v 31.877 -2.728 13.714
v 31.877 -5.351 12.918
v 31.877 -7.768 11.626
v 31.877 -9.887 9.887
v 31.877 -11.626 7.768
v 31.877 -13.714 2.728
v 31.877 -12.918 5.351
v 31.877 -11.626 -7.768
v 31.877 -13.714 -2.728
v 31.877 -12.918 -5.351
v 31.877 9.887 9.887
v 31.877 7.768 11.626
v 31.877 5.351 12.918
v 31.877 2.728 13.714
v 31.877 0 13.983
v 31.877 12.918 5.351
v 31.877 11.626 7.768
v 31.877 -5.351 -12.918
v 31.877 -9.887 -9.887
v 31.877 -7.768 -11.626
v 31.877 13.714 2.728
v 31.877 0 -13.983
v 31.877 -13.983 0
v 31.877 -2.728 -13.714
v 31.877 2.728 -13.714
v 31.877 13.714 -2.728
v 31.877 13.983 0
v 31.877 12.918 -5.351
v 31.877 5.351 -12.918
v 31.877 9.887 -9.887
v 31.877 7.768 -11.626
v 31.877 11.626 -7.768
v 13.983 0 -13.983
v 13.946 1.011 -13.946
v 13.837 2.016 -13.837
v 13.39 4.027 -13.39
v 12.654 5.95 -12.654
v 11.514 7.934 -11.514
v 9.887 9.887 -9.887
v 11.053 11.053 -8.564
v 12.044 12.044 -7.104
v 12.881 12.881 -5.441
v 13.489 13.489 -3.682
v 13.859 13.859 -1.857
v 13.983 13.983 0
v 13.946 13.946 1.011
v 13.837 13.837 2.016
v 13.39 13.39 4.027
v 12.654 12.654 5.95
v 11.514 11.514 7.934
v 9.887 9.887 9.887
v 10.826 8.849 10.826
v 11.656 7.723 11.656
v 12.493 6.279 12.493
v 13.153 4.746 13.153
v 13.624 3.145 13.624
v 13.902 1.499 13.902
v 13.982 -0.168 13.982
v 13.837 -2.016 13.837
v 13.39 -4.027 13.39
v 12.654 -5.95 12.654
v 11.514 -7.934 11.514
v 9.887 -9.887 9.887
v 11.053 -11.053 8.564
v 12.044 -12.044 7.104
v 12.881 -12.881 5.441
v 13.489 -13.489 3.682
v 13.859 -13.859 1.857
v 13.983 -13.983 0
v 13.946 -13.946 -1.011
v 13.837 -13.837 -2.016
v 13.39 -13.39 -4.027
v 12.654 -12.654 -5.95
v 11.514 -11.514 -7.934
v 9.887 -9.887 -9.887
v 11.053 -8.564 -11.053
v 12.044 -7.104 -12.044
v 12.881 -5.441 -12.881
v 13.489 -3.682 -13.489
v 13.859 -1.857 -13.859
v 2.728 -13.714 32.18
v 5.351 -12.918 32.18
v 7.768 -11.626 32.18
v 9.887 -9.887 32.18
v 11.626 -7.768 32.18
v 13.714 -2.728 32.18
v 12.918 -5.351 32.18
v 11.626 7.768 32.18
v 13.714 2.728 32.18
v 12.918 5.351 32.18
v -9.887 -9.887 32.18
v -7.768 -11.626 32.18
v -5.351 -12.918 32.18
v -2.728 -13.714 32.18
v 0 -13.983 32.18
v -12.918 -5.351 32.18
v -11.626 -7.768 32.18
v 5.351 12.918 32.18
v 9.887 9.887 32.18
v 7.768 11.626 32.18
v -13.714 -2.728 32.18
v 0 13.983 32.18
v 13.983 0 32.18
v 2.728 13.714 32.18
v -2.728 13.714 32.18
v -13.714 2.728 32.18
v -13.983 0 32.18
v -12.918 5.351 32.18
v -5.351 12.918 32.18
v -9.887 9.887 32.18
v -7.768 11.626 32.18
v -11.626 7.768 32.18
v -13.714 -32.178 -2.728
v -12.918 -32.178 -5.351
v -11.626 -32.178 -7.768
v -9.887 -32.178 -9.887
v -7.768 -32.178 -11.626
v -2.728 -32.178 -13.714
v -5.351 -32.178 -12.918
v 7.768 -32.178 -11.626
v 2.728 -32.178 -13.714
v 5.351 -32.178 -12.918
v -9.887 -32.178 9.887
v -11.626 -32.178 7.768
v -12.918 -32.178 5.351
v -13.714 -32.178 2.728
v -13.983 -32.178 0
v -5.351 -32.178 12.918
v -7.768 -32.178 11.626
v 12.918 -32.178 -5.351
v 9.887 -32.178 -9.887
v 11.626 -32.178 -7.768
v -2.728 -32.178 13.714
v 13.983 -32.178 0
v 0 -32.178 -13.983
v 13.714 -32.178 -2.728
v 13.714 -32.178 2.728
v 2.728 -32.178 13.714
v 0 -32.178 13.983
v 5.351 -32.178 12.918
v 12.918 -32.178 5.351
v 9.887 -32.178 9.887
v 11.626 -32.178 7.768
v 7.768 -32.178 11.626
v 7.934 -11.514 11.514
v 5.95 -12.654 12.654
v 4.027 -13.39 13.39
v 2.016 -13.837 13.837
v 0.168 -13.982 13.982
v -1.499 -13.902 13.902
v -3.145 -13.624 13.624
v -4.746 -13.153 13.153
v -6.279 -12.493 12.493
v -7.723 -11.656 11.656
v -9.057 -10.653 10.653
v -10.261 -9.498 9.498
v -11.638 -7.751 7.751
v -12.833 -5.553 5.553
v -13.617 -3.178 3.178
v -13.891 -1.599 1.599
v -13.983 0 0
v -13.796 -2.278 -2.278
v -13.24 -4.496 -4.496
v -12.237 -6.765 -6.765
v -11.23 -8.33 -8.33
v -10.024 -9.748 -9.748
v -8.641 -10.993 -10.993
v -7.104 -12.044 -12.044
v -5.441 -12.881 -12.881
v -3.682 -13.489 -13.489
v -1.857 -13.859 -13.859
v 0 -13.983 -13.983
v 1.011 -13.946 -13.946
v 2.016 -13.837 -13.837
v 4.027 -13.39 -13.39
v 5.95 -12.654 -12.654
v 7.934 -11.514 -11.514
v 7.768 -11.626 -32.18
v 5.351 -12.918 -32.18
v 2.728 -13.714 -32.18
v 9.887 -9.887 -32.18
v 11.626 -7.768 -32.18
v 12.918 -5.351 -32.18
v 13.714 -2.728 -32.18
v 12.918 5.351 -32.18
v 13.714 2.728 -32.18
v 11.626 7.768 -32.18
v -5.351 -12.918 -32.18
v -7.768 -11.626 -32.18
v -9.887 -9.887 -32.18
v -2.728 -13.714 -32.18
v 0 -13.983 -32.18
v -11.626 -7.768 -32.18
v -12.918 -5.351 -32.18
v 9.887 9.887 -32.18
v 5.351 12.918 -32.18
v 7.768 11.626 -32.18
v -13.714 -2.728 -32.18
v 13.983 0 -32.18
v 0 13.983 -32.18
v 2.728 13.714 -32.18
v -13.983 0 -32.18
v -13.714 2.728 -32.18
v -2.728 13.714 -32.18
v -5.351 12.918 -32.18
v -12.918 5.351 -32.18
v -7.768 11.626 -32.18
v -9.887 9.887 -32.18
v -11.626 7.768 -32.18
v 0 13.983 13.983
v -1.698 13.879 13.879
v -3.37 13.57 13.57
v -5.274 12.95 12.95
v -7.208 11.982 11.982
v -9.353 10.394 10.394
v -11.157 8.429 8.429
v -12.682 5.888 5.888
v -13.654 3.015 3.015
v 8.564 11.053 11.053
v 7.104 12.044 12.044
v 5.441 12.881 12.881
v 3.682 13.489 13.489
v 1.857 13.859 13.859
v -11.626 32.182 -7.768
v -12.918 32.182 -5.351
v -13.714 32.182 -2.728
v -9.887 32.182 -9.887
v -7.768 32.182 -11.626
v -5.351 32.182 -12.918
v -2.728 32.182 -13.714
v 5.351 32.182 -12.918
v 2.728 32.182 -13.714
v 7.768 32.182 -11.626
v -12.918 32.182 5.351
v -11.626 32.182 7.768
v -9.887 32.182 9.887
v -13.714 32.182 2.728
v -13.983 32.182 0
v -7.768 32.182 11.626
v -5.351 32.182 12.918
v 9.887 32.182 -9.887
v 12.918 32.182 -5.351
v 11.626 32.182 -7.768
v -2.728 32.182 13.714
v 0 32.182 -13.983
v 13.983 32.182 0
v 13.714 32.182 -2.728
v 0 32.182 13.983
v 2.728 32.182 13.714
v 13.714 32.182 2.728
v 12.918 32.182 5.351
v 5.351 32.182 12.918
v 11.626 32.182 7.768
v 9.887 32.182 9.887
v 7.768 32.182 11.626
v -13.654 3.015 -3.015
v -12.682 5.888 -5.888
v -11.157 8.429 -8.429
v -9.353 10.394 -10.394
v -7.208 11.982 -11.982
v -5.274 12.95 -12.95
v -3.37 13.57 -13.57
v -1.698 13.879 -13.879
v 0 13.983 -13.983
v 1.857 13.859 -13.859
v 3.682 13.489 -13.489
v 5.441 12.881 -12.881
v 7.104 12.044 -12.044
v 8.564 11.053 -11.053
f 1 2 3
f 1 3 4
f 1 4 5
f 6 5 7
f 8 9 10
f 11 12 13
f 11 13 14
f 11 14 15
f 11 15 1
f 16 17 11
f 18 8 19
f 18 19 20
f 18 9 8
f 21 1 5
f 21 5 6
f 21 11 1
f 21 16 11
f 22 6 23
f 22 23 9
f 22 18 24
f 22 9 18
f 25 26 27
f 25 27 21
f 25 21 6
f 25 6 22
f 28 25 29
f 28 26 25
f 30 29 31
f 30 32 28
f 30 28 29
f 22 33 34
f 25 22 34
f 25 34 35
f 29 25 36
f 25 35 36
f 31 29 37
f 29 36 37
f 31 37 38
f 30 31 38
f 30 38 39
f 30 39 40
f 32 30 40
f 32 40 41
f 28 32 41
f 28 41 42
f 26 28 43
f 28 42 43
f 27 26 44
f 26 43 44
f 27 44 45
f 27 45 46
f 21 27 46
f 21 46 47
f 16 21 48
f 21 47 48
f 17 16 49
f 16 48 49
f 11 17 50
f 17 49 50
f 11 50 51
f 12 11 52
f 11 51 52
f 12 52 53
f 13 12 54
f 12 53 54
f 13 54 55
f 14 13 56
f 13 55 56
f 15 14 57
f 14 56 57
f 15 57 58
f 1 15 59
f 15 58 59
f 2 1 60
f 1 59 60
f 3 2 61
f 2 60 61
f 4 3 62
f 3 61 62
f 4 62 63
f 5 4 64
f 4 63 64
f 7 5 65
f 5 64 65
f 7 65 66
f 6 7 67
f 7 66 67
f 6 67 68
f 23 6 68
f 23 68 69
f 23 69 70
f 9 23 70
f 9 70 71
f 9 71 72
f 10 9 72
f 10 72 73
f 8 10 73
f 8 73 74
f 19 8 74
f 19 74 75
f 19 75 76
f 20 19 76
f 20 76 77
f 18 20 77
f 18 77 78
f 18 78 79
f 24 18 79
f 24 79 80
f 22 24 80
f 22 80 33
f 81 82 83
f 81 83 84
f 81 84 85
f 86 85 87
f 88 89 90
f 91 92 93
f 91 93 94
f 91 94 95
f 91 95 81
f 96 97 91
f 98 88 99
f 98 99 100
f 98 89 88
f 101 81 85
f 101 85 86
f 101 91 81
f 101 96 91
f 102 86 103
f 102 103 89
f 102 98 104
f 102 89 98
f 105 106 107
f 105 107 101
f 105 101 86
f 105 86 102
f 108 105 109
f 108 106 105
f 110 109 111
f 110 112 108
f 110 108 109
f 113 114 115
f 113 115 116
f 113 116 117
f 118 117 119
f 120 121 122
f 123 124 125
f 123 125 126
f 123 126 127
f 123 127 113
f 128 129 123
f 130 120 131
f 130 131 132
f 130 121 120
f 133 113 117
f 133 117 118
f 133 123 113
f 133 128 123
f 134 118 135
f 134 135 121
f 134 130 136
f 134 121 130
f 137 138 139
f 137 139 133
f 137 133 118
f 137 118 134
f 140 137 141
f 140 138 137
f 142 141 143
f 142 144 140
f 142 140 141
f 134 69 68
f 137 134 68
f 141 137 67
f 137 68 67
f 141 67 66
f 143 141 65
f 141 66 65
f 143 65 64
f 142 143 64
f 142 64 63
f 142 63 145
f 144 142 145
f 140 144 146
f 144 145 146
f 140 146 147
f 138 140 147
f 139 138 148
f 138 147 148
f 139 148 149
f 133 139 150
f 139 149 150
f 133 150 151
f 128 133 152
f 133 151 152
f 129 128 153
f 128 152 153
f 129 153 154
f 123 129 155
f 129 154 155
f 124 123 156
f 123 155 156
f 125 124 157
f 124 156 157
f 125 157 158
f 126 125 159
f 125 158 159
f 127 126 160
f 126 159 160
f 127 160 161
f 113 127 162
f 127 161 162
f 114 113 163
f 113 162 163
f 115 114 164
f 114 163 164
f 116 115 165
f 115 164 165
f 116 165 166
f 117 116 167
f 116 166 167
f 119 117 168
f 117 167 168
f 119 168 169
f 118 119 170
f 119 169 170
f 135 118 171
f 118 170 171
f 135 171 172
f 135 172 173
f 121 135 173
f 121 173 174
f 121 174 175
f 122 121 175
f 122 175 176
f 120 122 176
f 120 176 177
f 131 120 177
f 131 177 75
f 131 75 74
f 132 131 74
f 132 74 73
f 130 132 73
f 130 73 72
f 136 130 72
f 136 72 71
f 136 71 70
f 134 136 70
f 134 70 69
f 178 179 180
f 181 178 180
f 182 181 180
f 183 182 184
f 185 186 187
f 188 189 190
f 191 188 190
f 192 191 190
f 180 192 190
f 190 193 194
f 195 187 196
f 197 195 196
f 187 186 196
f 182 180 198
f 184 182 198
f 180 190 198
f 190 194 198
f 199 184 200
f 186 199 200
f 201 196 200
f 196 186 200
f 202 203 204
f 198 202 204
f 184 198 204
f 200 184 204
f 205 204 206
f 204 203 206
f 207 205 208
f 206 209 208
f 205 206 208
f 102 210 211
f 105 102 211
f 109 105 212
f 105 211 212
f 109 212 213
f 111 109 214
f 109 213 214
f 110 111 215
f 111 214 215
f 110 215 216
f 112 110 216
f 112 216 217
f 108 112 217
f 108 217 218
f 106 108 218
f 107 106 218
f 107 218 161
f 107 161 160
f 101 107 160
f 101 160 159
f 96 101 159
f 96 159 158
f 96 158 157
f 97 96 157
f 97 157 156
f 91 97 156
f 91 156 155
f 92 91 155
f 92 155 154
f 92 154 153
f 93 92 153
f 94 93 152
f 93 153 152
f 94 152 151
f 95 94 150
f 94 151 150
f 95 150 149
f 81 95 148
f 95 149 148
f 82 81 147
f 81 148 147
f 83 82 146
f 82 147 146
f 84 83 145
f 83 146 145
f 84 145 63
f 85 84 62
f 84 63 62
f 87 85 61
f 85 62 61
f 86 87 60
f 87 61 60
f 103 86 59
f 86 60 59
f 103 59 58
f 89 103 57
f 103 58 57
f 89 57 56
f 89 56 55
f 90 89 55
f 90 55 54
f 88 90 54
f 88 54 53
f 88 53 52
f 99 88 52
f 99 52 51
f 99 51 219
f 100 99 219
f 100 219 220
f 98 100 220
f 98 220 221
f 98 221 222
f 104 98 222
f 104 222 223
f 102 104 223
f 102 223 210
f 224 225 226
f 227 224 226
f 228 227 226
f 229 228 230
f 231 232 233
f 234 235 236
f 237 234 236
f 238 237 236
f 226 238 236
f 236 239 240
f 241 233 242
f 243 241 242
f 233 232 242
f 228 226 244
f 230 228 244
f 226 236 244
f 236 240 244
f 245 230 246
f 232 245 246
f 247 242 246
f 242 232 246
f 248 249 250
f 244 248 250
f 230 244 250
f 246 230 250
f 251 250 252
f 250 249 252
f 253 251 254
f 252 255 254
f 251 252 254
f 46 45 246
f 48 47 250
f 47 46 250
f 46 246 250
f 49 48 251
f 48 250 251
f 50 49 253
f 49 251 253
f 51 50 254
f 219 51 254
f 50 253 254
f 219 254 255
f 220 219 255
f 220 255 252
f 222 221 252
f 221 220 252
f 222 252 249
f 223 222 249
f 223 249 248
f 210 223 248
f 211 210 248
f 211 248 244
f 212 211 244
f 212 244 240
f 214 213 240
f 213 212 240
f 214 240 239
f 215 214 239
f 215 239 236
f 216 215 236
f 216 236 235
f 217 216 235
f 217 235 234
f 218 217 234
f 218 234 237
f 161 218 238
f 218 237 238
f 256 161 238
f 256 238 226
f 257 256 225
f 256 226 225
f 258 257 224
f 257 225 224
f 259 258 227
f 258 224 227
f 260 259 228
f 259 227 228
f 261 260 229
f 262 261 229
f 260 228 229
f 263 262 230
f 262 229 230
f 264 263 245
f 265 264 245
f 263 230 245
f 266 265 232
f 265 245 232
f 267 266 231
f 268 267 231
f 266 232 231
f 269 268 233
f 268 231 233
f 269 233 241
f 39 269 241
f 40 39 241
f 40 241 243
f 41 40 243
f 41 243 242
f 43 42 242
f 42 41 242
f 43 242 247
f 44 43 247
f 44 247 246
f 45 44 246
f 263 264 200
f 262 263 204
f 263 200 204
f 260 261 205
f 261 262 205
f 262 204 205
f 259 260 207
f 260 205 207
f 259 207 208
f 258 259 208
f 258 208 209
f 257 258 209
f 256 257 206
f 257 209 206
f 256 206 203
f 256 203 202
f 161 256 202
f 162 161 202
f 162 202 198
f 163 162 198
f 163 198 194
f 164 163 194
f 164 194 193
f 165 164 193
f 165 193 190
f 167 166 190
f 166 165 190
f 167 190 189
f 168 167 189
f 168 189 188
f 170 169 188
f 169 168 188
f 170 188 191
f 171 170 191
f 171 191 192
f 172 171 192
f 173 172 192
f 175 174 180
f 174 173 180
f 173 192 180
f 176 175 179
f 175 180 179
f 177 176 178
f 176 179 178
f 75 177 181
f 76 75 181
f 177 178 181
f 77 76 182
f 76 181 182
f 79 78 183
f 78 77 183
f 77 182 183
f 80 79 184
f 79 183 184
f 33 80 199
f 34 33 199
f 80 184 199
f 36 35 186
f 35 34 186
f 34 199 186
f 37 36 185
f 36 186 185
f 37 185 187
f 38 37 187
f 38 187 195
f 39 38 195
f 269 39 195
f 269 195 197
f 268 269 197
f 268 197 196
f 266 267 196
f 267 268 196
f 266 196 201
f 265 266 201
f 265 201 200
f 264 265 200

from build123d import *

# Parameters (mm, degrees)
CYLINDER013_R     = 13.9827
CYLINDER013_DEPTH = 64.36
CYLINDER011_R     = 13.9827
CYLINDER011_DEPTH = 64.36
CYLINDER012_R     = 13.9827
CYLINDER012_DEPTH = 31.877


with BuildPart() as cylinder013:
    # Cylinder013 → Cylinder013 (new body)
    with BuildSketch(Plane(origin=(0, 0, -32.18), x_dir=(0, 1, 0), z_dir=(0, 0, 1))):
        Circle(CYLINDER013_R)
    extrude(amount=CYLINDER013_DEPTH)


with BuildPart() as cylinder011:
    # Cylinder011 → Cylinder011 (new body)
    with BuildSketch(Plane.XZ.offset(-32.1818)):
        Circle(CYLINDER011_R)
    extrude(amount=CYLINDER011_DEPTH)


with BuildPart() as f_5_way:
    # Cylinder012 → Cylinder012 (new body)
    with BuildSketch(Plane(origin=(0, 0, 0), x_dir=(0, 0, -1), z_dir=(1, 0, 0))):
        Circle(CYLINDER012_R)
    extrude(amount=CYLINDER012_DEPTH)

    # Fusion005: union Cylinder013, Cylinder011
    add(cylinder013.part)
    add(cylinder011.part)


solid = f_5_way.part
